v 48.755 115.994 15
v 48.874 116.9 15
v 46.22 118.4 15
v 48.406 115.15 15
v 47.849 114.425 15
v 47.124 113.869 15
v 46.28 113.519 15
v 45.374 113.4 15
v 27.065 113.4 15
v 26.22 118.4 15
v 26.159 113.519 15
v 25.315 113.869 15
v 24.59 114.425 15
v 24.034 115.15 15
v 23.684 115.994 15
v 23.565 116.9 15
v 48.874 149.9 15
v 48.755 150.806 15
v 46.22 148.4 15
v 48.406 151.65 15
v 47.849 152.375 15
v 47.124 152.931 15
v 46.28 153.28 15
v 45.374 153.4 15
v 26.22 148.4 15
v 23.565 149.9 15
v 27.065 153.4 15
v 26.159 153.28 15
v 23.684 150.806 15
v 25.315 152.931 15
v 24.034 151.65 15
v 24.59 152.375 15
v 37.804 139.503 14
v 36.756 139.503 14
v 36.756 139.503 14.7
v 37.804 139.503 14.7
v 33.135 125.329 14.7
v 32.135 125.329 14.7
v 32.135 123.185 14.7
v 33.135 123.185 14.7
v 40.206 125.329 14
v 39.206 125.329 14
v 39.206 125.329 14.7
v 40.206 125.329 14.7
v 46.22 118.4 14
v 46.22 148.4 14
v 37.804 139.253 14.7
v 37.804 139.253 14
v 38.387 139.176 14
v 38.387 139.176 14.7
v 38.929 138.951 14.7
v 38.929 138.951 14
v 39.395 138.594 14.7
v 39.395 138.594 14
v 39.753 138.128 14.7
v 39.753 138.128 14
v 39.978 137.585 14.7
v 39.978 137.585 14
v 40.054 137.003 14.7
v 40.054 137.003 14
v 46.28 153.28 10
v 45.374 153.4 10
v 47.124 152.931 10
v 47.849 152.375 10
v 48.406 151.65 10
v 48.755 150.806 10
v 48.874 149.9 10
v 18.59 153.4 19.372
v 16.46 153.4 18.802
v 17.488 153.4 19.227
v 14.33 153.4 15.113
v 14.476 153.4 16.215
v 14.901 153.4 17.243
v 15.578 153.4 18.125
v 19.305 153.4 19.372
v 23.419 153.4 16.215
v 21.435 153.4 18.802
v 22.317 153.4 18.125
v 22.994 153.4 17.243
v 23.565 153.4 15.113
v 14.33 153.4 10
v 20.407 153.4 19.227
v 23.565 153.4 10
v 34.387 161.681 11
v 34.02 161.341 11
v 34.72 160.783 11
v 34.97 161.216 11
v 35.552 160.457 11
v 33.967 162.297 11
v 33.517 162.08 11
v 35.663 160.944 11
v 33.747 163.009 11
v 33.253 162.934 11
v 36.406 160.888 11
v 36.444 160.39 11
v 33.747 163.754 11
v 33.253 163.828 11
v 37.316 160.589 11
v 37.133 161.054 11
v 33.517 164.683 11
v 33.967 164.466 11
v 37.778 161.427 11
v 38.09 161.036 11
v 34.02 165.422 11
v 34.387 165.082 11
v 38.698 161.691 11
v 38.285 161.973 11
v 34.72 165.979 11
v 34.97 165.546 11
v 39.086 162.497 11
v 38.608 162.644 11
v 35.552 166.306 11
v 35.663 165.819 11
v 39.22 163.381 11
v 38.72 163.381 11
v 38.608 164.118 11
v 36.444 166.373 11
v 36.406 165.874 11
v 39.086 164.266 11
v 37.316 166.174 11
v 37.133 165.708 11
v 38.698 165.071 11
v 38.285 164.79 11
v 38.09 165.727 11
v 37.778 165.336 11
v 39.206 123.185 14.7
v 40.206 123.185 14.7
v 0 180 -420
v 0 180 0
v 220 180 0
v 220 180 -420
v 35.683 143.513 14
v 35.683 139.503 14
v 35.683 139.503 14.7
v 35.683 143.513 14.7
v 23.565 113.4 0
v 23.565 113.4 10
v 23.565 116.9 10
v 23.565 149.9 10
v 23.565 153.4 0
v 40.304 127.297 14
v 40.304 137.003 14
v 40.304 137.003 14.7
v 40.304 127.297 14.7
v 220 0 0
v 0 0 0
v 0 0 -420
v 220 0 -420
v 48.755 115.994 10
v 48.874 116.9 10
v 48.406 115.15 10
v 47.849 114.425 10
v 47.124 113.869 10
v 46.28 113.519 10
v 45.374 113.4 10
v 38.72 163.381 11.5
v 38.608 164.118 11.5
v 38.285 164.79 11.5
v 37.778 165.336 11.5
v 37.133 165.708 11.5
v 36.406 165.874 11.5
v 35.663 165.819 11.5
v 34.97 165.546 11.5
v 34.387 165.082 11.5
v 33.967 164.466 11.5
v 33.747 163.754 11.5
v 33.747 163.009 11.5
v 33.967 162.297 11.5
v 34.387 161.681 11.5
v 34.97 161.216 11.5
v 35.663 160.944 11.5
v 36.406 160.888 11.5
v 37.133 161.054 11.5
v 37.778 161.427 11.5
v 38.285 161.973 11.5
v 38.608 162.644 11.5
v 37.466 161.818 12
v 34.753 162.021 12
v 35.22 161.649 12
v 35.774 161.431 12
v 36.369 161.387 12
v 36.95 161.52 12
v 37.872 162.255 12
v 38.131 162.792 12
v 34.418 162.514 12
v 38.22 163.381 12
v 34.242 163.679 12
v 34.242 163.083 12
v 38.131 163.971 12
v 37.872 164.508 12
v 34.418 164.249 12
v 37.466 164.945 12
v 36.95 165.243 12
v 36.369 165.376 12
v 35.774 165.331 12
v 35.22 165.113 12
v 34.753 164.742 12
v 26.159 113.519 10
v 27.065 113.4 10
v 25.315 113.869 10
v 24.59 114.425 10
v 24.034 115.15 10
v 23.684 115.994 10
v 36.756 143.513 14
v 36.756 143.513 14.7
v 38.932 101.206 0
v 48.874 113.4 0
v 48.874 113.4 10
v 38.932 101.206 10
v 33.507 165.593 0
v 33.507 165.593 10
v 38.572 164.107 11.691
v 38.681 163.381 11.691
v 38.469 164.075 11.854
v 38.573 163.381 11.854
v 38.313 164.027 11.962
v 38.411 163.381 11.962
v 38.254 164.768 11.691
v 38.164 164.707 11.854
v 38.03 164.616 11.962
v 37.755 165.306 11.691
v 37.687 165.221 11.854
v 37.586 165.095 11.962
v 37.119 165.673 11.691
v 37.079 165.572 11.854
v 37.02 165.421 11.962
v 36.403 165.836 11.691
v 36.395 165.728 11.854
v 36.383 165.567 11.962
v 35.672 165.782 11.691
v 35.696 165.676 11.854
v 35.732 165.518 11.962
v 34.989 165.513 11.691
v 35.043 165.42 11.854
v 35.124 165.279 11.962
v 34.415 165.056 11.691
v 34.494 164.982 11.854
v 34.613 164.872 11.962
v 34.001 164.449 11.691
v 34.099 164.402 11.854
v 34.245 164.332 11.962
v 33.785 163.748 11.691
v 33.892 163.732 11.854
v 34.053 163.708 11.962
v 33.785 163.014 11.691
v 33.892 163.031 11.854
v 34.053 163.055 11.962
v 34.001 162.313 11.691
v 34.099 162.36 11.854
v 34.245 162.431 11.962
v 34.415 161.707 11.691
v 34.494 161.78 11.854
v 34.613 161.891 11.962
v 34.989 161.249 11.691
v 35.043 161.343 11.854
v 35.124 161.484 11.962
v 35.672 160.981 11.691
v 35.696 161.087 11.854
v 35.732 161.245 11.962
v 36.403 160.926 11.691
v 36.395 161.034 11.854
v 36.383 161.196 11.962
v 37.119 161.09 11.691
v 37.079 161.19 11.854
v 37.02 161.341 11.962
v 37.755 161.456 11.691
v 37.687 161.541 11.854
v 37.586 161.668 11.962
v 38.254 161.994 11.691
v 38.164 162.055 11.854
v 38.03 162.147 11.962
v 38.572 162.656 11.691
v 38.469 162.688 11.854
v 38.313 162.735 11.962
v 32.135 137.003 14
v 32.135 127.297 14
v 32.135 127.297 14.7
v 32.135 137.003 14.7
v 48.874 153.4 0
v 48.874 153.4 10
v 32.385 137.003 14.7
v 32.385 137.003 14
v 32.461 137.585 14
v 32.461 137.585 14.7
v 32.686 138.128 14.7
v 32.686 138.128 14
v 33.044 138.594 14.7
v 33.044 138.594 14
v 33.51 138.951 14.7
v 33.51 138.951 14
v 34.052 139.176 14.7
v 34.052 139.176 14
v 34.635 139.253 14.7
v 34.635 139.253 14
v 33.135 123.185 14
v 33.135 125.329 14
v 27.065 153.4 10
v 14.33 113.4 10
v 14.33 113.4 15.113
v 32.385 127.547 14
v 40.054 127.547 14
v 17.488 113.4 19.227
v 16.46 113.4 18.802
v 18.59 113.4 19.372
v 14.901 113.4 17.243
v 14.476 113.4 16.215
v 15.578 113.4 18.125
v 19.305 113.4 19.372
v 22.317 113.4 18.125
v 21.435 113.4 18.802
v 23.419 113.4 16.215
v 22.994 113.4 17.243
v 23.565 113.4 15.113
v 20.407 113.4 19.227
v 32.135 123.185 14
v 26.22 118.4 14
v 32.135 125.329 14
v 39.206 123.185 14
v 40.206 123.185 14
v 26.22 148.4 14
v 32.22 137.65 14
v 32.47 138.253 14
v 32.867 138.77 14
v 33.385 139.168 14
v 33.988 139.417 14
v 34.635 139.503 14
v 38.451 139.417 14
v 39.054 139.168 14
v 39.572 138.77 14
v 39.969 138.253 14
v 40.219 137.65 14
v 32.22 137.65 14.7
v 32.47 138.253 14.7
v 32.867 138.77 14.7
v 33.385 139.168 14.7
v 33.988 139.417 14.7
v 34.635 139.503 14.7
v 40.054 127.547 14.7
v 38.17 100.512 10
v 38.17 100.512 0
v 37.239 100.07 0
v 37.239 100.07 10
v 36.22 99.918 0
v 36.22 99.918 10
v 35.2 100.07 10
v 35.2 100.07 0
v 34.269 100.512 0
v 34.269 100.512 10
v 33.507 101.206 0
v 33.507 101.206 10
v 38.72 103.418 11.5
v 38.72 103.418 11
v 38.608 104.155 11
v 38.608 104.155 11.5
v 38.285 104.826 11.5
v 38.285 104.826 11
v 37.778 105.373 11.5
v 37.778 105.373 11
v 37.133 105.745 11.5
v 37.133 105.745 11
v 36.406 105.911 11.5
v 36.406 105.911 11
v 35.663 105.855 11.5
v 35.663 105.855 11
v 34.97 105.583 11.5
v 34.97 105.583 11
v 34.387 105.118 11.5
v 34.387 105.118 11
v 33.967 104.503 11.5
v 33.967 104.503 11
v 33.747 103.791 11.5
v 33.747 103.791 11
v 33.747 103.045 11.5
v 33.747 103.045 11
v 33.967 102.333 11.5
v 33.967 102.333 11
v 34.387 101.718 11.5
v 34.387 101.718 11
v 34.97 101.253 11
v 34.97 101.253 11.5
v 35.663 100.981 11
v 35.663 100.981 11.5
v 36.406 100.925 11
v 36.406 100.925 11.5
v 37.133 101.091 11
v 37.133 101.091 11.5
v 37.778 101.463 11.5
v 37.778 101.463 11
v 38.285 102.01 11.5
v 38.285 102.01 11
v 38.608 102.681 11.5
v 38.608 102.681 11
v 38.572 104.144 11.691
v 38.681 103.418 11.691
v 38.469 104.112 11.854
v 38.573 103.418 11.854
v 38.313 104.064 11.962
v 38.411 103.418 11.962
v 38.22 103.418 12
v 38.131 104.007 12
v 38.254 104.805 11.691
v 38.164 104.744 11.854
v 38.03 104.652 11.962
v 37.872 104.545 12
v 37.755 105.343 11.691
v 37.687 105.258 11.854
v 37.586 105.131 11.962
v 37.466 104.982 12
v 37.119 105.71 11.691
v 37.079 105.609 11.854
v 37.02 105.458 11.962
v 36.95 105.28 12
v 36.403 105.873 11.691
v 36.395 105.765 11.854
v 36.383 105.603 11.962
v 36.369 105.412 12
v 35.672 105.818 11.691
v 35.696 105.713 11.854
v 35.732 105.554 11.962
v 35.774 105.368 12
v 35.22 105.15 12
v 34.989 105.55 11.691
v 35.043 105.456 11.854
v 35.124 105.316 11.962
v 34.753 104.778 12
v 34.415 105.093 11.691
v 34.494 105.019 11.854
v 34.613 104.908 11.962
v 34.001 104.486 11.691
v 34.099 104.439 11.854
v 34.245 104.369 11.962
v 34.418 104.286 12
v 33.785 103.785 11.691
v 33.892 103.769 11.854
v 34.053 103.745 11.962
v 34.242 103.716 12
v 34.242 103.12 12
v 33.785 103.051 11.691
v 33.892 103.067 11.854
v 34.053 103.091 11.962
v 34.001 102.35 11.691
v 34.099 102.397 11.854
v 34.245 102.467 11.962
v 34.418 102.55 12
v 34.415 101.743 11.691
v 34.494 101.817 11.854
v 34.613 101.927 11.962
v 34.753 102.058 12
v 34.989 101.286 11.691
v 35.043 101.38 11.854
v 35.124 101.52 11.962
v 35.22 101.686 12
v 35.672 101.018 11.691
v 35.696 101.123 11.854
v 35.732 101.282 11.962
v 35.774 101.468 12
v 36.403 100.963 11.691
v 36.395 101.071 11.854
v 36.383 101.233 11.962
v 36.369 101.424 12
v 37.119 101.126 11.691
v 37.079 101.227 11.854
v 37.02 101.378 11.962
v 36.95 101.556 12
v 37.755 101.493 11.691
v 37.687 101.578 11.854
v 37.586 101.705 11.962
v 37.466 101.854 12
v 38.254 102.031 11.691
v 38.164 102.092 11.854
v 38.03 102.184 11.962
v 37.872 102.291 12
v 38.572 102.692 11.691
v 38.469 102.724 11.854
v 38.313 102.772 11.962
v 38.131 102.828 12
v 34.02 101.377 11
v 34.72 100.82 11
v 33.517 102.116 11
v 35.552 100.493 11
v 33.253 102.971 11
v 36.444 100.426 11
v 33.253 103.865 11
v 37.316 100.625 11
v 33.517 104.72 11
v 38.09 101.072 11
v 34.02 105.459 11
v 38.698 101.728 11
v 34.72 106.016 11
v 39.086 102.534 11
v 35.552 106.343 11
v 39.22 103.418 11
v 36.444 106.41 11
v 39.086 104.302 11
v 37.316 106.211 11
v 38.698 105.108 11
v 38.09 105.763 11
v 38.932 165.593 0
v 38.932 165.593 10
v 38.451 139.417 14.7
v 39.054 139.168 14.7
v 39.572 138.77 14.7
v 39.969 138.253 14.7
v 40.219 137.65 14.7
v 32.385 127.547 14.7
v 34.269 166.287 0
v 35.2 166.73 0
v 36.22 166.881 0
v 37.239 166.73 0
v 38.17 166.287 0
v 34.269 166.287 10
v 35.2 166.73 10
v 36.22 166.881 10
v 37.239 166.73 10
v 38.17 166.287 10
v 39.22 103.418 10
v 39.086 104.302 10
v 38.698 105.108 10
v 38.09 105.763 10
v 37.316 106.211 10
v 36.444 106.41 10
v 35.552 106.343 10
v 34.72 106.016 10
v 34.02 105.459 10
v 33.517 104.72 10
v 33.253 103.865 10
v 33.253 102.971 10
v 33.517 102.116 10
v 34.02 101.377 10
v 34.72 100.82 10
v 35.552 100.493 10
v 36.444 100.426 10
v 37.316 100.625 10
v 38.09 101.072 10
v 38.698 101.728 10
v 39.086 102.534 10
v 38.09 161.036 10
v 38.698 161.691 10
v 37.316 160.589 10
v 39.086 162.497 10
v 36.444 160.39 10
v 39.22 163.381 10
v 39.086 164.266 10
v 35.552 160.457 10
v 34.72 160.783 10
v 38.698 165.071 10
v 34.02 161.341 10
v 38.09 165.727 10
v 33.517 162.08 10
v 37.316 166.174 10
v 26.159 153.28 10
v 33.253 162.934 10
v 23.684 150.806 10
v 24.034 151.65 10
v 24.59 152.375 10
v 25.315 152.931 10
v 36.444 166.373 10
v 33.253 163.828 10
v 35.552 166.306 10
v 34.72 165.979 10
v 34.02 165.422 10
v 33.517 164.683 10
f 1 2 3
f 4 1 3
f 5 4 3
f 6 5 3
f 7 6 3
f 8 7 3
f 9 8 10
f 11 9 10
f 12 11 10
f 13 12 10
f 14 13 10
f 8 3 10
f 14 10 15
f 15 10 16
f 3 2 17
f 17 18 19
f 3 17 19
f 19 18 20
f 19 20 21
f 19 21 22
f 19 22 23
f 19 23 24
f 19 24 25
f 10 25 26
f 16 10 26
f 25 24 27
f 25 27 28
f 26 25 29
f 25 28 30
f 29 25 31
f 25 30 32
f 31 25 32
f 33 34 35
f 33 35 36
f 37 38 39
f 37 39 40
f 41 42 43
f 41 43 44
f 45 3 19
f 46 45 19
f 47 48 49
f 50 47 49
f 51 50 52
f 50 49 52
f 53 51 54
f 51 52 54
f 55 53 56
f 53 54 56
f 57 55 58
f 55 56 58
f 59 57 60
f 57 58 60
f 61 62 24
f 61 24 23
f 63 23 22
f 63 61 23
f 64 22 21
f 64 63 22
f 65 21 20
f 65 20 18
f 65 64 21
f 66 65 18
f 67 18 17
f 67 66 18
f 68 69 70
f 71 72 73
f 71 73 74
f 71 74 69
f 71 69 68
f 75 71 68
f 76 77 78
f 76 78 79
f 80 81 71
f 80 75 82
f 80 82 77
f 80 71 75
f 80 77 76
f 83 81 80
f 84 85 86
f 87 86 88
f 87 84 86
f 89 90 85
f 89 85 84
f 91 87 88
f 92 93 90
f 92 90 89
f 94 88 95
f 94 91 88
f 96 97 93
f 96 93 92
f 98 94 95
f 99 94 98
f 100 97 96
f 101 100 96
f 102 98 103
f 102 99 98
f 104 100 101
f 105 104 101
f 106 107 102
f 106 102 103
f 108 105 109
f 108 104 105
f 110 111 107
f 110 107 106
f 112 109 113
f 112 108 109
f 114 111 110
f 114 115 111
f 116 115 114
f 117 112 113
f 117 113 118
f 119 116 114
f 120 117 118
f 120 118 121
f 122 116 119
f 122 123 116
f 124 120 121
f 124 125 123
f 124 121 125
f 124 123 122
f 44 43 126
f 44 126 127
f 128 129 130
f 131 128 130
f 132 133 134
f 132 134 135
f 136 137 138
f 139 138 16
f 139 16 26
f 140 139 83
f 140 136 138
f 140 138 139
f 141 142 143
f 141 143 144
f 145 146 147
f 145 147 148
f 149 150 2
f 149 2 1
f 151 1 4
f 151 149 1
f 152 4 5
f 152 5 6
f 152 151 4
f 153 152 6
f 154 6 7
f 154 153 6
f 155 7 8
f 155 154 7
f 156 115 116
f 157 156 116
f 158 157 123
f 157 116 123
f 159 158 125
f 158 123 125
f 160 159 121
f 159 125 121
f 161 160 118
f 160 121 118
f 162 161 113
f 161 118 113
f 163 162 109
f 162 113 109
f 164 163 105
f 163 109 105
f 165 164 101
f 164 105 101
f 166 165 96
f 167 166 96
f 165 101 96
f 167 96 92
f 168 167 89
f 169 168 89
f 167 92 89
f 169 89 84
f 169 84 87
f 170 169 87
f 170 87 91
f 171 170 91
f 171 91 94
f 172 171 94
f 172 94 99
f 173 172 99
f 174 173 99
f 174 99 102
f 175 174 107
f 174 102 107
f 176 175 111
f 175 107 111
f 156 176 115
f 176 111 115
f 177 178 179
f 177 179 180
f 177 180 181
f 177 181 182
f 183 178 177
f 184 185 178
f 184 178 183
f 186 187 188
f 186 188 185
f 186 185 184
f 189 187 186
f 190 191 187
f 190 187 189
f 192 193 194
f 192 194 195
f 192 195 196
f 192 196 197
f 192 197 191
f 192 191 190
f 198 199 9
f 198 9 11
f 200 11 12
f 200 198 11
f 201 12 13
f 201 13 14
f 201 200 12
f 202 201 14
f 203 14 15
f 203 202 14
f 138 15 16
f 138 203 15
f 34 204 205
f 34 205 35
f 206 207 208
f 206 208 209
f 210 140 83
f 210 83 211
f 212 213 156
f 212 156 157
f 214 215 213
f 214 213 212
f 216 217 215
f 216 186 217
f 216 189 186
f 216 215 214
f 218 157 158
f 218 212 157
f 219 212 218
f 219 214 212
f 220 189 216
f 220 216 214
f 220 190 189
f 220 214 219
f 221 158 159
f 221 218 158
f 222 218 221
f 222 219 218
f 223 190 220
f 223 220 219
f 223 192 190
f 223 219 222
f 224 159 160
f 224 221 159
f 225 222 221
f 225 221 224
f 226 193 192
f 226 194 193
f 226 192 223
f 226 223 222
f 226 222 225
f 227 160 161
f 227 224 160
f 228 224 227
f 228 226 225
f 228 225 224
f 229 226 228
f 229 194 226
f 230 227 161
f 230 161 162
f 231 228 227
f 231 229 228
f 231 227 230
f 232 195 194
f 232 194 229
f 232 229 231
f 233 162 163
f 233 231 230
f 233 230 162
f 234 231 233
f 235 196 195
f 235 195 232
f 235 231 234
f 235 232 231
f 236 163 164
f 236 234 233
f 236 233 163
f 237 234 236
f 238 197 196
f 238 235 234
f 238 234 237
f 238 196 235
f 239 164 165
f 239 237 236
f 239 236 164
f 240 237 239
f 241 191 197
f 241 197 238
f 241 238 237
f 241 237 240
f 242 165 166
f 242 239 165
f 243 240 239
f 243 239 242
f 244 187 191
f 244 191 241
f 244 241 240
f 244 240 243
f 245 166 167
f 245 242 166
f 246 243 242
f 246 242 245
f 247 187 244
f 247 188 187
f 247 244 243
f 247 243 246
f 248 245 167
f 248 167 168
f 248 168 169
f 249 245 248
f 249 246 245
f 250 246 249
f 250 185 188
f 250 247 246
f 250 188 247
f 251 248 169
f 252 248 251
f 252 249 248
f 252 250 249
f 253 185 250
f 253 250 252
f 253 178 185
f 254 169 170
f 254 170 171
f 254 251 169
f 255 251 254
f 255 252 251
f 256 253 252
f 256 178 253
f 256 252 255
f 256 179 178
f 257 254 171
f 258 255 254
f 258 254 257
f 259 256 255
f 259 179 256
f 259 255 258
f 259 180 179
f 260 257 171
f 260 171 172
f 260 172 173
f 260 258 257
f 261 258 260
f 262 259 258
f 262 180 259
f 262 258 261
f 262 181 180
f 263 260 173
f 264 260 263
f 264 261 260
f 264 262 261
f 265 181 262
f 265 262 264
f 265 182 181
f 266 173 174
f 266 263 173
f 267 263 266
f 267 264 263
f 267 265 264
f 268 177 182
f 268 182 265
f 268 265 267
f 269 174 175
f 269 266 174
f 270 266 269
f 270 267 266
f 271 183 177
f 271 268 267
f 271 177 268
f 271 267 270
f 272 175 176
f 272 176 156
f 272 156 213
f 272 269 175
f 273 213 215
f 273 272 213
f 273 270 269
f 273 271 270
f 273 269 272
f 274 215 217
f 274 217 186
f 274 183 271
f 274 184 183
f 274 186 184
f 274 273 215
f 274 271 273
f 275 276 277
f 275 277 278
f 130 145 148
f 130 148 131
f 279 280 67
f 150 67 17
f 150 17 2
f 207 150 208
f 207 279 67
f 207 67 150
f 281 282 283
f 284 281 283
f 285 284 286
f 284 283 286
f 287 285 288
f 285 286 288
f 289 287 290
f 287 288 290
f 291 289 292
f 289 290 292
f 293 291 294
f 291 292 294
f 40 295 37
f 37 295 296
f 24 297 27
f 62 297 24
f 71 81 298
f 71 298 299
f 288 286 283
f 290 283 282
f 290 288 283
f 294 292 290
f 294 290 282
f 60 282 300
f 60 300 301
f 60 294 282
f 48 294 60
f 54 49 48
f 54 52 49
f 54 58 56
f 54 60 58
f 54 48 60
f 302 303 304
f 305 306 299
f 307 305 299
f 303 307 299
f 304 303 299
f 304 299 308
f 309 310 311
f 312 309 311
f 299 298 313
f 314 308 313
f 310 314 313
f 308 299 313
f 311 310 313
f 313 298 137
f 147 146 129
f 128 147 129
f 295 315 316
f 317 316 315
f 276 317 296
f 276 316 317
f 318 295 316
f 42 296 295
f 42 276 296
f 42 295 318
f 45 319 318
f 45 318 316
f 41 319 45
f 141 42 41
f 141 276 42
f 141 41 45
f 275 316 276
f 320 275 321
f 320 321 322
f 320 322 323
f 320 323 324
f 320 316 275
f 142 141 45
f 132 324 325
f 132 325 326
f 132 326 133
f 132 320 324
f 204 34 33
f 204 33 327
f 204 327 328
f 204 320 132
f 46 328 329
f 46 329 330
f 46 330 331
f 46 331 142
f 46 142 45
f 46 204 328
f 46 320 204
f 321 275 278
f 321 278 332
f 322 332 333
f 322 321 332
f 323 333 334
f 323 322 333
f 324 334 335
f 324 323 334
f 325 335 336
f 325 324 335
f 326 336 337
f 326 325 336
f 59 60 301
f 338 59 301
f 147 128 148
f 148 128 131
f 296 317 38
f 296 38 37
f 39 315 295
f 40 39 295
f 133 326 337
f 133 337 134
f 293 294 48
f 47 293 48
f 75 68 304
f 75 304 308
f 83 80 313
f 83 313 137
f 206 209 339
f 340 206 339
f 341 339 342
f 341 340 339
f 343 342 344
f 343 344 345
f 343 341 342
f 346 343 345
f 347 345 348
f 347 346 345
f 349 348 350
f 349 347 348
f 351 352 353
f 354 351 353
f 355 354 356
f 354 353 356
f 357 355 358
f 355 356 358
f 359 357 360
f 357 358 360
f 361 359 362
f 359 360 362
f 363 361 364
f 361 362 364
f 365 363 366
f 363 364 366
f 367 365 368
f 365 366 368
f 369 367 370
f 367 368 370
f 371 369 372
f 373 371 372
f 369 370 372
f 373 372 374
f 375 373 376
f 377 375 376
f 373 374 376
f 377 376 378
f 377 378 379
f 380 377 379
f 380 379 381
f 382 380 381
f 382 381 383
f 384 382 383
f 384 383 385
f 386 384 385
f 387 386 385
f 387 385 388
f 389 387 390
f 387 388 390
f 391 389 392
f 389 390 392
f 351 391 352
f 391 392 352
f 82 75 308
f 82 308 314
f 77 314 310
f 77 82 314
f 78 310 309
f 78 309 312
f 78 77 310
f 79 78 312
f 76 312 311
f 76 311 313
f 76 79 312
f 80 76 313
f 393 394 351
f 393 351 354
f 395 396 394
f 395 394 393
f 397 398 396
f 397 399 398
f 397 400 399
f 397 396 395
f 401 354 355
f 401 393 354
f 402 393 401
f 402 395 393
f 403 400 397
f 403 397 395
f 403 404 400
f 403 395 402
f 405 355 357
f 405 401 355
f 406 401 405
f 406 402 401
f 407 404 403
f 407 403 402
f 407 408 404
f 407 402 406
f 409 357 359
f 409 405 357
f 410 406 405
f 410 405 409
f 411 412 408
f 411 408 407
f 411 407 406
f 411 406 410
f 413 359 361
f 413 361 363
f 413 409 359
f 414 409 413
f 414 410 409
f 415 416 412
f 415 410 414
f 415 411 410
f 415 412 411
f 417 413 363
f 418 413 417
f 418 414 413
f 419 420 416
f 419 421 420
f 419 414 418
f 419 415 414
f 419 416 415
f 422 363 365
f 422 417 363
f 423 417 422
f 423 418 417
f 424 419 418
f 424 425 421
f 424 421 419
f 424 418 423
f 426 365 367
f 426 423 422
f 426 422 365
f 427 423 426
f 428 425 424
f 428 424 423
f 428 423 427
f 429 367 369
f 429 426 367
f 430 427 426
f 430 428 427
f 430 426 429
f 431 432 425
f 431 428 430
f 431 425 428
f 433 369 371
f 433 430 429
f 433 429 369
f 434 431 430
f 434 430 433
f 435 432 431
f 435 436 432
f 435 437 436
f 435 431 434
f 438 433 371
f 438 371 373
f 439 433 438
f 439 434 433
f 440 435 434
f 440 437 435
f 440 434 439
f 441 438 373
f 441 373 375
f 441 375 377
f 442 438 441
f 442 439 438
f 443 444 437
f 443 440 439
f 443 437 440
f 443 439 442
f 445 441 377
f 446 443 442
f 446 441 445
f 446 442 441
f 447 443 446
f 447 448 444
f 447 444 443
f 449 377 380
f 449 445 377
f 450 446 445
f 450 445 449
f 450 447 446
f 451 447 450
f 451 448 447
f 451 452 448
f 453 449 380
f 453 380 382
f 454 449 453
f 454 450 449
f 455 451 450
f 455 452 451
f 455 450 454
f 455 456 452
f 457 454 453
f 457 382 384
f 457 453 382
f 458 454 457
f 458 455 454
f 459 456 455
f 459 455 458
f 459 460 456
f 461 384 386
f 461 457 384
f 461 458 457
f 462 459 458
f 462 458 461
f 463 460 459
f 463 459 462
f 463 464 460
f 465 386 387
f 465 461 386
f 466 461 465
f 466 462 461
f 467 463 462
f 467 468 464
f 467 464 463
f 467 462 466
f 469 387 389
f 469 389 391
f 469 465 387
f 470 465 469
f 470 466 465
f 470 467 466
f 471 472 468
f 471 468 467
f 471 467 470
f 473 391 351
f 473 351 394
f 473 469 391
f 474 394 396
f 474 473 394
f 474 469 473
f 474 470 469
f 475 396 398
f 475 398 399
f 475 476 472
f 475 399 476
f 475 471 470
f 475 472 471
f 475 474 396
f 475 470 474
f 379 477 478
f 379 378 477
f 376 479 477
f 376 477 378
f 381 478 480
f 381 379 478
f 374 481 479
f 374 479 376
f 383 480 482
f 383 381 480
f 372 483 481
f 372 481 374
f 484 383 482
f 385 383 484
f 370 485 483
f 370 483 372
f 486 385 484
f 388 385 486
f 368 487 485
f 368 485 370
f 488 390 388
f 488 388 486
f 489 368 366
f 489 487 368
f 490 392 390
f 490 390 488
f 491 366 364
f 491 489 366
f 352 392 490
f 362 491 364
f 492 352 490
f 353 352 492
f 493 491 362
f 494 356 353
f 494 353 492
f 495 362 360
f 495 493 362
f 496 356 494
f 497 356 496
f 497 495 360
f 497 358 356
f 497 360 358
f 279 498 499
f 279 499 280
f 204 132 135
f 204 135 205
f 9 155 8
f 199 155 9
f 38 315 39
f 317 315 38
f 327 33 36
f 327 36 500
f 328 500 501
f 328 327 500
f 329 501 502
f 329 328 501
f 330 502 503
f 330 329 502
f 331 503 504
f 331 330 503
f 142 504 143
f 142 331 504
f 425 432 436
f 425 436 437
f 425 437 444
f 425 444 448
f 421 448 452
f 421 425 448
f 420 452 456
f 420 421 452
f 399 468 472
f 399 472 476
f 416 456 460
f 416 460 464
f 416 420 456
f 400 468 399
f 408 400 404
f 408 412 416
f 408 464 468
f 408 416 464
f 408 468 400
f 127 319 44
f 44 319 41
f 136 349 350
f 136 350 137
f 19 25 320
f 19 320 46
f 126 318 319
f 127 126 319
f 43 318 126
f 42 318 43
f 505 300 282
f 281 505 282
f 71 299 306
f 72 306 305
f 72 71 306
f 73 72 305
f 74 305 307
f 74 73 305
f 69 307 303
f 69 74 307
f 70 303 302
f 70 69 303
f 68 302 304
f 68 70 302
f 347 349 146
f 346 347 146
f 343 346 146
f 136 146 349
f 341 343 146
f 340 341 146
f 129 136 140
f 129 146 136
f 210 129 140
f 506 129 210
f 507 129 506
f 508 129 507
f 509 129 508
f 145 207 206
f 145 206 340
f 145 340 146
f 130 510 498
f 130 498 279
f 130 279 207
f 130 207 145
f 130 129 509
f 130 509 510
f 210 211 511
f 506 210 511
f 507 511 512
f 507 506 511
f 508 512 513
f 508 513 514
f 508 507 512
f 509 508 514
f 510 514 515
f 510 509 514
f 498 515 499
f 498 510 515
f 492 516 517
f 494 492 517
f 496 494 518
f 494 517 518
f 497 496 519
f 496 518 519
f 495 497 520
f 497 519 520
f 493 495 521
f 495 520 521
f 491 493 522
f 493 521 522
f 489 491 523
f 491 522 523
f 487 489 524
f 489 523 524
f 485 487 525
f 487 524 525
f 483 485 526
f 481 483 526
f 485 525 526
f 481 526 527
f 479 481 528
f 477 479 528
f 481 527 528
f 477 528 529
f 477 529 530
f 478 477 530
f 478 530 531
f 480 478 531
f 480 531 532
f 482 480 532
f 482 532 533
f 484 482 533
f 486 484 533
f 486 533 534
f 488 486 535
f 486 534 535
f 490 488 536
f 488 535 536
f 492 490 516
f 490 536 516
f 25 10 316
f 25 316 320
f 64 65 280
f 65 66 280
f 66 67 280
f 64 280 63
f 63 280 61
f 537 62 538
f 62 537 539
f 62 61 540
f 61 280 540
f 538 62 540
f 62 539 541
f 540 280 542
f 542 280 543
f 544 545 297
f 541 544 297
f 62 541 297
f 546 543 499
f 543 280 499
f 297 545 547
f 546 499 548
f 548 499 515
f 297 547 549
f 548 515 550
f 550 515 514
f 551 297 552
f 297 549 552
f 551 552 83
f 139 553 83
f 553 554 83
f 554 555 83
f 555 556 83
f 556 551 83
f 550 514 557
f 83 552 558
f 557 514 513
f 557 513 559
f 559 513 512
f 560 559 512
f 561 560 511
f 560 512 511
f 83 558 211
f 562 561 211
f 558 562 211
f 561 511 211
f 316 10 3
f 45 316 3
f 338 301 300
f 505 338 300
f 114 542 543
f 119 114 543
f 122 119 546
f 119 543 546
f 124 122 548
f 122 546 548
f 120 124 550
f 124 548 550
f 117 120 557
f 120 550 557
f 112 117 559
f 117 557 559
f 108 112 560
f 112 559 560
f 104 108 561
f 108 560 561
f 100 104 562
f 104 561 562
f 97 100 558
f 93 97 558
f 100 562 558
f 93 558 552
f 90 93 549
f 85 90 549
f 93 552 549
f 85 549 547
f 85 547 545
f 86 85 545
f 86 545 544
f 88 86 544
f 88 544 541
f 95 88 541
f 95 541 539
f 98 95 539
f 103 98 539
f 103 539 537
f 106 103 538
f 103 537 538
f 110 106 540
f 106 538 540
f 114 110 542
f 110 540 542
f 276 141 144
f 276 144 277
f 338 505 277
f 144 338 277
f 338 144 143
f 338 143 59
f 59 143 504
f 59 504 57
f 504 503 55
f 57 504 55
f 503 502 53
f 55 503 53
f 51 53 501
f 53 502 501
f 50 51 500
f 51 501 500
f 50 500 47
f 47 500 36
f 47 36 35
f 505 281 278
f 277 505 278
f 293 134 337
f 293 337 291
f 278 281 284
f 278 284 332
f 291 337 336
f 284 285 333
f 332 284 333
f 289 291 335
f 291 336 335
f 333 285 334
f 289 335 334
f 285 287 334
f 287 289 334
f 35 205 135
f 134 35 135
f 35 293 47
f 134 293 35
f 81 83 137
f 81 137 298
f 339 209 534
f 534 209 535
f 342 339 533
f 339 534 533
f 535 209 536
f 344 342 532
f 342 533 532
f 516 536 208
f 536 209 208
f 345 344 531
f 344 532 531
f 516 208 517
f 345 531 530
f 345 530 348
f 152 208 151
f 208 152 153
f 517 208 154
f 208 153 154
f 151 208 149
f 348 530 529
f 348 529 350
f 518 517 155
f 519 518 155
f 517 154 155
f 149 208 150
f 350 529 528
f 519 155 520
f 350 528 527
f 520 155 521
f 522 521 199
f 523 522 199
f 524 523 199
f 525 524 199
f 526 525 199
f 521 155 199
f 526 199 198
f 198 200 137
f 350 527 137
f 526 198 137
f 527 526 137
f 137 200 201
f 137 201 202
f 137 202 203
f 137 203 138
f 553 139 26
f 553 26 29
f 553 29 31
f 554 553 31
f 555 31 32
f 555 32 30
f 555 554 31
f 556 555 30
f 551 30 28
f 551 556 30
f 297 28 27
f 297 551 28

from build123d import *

# Parameters (mm, degrees)
SKETCH1_W           = 220
SKETCH1_H           = 180
BOSS_EXTRUDE1_DEPTH = 420
BOSS_EXTRUDE2_DEPTH = 10
BOSS_EXTRUDE3_DEPTH = 5
SKETCH4_R           = 3
BOSS_EXTRUDE4_DEPTH = 1
SKETCH5_R           = 2.5
BOSS_EXTRUDE5_DEPTH = 1
FILLET1_R           = 0.5
FILLET2_R           = 0.5
SKETCH6_W           = 20
SKETCH6_H           = 30
CUT_EXTRUDE1_DEPTH  = 1
SKETCH7_W           = 1
SKETCH7_H           = 2.143442922
BOSS_EXTRUDE6_DEPTH = 0.7
BOSS_EXTRUDE8_DEPTH = 40


with BuildPart() as part:
    # Sketch1 → Boss-Extrude1 (new body)
    with BuildSketch(Plane.XY):
        with Locations((110, 90)):
            Rectangle(SKETCH1_W, SKETCH1_H)
    extrude(amount=-BOSS_EXTRUDE1_DEPTH)

    # Sketch2 → Boss-Extrude2 (add)
    with BuildSketch(Plane.XY):
        with BuildLine():
            Line((23.564602078, 153.399638111), (33.506942996, 165.593075087))
            ThreePointArc((33.506942996, 165.593075087), (36.219508404, 166.881290985), (38.932073811, 165.593075087))
            Line((38.932073811, 165.593075087), (48.874414729, 153.399638111))
            Line((48.874414729, 153.399638111), (48.874414729, 113.399638111))
            Line((48.874414729, 113.399638111), (38.932073811, 101.206201136))
            ThreePointArc((38.932073811, 101.206201136), (36.219508404, 99.917985238), (33.506942996, 101.206201136))
            Line((33.506942996, 101.206201136), (23.564602078, 113.399638111))
            Line((23.564602078, 113.399638111), (23.564602078, 153.399638111))
        make_face()
    extrude(amount=BOSS_EXTRUDE2_DEPTH)

    # Sketch3 → Boss-Extrude3 (add)
    with BuildSketch(Plane.XY.offset(10)):
        with BuildLine():
            Line((27.064602078, 153.399638111), (45.374414729, 153.399638111))
            ThreePointArc((45.374414729, 153.399638111), (47.849288463, 152.374511846), (48.874414729, 149.899638111))
            Line((48.874414729, 149.899638111), (48.874414729, 116.899638111))
            ThreePointArc((48.874414729, 116.899638111), (47.849288463, 114.424764377), (45.374414729, 113.399638111))
            Line((45.374414729, 113.399638111), (27.064602078, 113.399638111))
            ThreePointArc((27.064602078, 113.399638111), (24.589728344, 114.424764377), (23.564602078, 116.899638111))
            Line((23.564602078, 116.899638111), (23.564602078, 149.899638111))
            ThreePointArc((23.564602078, 149.899638111), (24.589728344, 152.374511846), (27.064602078, 153.399638111))
        make_face()
    extrude(amount=BOSS_EXTRUDE3_DEPTH)

    # Sketch4 → Boss-Extrude4 (add)
    with BuildSketch(Plane.XY.offset(10)):
        with Locations((36.219508404, 163.381290985)):
            Circle(SKETCH4_R)
        with Locations((36.219508404, 103.417985238)):
            Circle(SKETCH4_R)
    extrude(amount=BOSS_EXTRUDE4_DEPTH)

    # Sketch5 → Boss-Extrude5 (add)
    with BuildSketch(Plane.XY.offset(11)):
        with Locations((36.219508404, 163.381290985)):
            Circle(SKETCH5_R)
        with Locations((36.219508404, 103.417985238)):
            Circle(SKETCH5_R)
    extrude(amount=BOSS_EXTRUDE5_DEPTH)

    # Fillet1
    fillet1_edges = [part.edges().sort_by_distance(p)[0] for p in [
        (33.719508404, 163.381290985, 12),
    ]]
    fillet(fillet1_edges, radius=FILLET1_R)

    # Fillet2
    fillet2_edges = [part.edges().sort_by_distance(p)[0] for p in [
        (33.719508404, 103.417985238, 12),
    ]]
    fillet(fillet2_edges, radius=FILLET2_R)

    # Sketch6 → Cut-Extrude1 (cut)
    with BuildSketch(Plane.XY.offset(15)):
        with Locations((36.219508404, 133.399638111)):
            Rectangle(SKETCH6_W, SKETCH6_H)
    extrude(amount=-CUT_EXTRUDE1_DEPTH, mode=Mode.SUBTRACT)

    # Sketch7 → Boss-Extrude6 (add)
    with BuildSketch(Plane.XY.offset(14)):
        with BuildLine():
            Line((36.756177122, 139.502564755), (37.804208618, 139.502564755))
            ThreePointArc((37.804208618, 139.502564755), (39.571975571, 138.770331708), (40.304208618, 137.002564755))
            Line((40.304208618, 137.002564755), (40.304208618, 127.296711468))
            Line((40.304208618, 127.296711468), (32.13480819, 127.296711468))
            Line((32.13480819, 127.296711468), (32.13480819, 137.002564755))
            ThreePointArc((32.13480819, 137.002564755), (32.867041237, 138.770331708), (34.63480819, 139.502564755))
            Line((34.63480819, 139.502564755), (35.682839685, 139.502564755))
            Line((35.682839685, 139.502564755), (35.682839685, 143.513382968))
            Line((35.682839685, 143.513382968), (36.756177122, 143.513382968))
            Line((36.756177122, 143.513382968), (36.756177122, 139.502564755))
        make_face()
        with BuildLine():
            Line((32.38480819, 127.546711468), (32.38480819, 137.002564755))
            ThreePointArc((32.38480819, 137.002564755), (33.043817932, 138.593555013), (34.63480819, 139.252564755))
            Line((34.63480819, 139.252564755), (35.932839685, 139.252564755))
            Line((35.932839685, 139.252564755), (36.506177122, 139.252564755))
            Line((36.506177122, 139.252564755), (37.804208618, 139.252564755))
            ThreePointArc((37.804208618, 139.252564755), (39.395198875, 138.593555013), (40.054208618, 137.002564755))
            Line((40.054208618, 137.002564755), (40.054208618, 127.546711468))
            Line((40.054208618, 127.546711468), (32.38480819, 127.546711468))
        make_face(mode=Mode.SUBTRACT)
        with Locations((32.63480819, 124.257038726)):
            Rectangle(SKETCH7_W, SKETCH7_H)
        with Locations((39.706049566, 124.257038726)):
            Rectangle(SKETCH7_W, SKETCH7_H)
    extrude(amount=BOSS_EXTRUDE6_DEPTH)


with BuildPart() as body_2:
    # Sketch8 → Boss-Extrude8 (new body)
    with BuildSketch(Plane(origin=(0, 153.399638111, 0), x_dir=(1, 0, 0), z_dir=(0, 1, 0))):
        with BuildLine():
            Line((23.564602078, -10), (14.33043312, -10))
            Line((14.33043312, -10), (14.33043312, -15.112636543))
            ThreePointArc((14.33043312, -15.112636543), (15.578080845, -18.124724601), (18.590168902, -19.372372325))
            Line((18.590168902, -19.372372325), (19.304866296, -19.372372325))
            ThreePointArc((19.304866296, -19.372372325), (22.316954354, -18.124724601), (23.564602078, -15.112636543))
            Line((23.564602078, -15.112636543), (23.564602078, -10))
        make_face()
    extrude(amount=-BOSS_EXTRUDE8_DEPTH)


solid = Compound([part.part, body_2.part])
